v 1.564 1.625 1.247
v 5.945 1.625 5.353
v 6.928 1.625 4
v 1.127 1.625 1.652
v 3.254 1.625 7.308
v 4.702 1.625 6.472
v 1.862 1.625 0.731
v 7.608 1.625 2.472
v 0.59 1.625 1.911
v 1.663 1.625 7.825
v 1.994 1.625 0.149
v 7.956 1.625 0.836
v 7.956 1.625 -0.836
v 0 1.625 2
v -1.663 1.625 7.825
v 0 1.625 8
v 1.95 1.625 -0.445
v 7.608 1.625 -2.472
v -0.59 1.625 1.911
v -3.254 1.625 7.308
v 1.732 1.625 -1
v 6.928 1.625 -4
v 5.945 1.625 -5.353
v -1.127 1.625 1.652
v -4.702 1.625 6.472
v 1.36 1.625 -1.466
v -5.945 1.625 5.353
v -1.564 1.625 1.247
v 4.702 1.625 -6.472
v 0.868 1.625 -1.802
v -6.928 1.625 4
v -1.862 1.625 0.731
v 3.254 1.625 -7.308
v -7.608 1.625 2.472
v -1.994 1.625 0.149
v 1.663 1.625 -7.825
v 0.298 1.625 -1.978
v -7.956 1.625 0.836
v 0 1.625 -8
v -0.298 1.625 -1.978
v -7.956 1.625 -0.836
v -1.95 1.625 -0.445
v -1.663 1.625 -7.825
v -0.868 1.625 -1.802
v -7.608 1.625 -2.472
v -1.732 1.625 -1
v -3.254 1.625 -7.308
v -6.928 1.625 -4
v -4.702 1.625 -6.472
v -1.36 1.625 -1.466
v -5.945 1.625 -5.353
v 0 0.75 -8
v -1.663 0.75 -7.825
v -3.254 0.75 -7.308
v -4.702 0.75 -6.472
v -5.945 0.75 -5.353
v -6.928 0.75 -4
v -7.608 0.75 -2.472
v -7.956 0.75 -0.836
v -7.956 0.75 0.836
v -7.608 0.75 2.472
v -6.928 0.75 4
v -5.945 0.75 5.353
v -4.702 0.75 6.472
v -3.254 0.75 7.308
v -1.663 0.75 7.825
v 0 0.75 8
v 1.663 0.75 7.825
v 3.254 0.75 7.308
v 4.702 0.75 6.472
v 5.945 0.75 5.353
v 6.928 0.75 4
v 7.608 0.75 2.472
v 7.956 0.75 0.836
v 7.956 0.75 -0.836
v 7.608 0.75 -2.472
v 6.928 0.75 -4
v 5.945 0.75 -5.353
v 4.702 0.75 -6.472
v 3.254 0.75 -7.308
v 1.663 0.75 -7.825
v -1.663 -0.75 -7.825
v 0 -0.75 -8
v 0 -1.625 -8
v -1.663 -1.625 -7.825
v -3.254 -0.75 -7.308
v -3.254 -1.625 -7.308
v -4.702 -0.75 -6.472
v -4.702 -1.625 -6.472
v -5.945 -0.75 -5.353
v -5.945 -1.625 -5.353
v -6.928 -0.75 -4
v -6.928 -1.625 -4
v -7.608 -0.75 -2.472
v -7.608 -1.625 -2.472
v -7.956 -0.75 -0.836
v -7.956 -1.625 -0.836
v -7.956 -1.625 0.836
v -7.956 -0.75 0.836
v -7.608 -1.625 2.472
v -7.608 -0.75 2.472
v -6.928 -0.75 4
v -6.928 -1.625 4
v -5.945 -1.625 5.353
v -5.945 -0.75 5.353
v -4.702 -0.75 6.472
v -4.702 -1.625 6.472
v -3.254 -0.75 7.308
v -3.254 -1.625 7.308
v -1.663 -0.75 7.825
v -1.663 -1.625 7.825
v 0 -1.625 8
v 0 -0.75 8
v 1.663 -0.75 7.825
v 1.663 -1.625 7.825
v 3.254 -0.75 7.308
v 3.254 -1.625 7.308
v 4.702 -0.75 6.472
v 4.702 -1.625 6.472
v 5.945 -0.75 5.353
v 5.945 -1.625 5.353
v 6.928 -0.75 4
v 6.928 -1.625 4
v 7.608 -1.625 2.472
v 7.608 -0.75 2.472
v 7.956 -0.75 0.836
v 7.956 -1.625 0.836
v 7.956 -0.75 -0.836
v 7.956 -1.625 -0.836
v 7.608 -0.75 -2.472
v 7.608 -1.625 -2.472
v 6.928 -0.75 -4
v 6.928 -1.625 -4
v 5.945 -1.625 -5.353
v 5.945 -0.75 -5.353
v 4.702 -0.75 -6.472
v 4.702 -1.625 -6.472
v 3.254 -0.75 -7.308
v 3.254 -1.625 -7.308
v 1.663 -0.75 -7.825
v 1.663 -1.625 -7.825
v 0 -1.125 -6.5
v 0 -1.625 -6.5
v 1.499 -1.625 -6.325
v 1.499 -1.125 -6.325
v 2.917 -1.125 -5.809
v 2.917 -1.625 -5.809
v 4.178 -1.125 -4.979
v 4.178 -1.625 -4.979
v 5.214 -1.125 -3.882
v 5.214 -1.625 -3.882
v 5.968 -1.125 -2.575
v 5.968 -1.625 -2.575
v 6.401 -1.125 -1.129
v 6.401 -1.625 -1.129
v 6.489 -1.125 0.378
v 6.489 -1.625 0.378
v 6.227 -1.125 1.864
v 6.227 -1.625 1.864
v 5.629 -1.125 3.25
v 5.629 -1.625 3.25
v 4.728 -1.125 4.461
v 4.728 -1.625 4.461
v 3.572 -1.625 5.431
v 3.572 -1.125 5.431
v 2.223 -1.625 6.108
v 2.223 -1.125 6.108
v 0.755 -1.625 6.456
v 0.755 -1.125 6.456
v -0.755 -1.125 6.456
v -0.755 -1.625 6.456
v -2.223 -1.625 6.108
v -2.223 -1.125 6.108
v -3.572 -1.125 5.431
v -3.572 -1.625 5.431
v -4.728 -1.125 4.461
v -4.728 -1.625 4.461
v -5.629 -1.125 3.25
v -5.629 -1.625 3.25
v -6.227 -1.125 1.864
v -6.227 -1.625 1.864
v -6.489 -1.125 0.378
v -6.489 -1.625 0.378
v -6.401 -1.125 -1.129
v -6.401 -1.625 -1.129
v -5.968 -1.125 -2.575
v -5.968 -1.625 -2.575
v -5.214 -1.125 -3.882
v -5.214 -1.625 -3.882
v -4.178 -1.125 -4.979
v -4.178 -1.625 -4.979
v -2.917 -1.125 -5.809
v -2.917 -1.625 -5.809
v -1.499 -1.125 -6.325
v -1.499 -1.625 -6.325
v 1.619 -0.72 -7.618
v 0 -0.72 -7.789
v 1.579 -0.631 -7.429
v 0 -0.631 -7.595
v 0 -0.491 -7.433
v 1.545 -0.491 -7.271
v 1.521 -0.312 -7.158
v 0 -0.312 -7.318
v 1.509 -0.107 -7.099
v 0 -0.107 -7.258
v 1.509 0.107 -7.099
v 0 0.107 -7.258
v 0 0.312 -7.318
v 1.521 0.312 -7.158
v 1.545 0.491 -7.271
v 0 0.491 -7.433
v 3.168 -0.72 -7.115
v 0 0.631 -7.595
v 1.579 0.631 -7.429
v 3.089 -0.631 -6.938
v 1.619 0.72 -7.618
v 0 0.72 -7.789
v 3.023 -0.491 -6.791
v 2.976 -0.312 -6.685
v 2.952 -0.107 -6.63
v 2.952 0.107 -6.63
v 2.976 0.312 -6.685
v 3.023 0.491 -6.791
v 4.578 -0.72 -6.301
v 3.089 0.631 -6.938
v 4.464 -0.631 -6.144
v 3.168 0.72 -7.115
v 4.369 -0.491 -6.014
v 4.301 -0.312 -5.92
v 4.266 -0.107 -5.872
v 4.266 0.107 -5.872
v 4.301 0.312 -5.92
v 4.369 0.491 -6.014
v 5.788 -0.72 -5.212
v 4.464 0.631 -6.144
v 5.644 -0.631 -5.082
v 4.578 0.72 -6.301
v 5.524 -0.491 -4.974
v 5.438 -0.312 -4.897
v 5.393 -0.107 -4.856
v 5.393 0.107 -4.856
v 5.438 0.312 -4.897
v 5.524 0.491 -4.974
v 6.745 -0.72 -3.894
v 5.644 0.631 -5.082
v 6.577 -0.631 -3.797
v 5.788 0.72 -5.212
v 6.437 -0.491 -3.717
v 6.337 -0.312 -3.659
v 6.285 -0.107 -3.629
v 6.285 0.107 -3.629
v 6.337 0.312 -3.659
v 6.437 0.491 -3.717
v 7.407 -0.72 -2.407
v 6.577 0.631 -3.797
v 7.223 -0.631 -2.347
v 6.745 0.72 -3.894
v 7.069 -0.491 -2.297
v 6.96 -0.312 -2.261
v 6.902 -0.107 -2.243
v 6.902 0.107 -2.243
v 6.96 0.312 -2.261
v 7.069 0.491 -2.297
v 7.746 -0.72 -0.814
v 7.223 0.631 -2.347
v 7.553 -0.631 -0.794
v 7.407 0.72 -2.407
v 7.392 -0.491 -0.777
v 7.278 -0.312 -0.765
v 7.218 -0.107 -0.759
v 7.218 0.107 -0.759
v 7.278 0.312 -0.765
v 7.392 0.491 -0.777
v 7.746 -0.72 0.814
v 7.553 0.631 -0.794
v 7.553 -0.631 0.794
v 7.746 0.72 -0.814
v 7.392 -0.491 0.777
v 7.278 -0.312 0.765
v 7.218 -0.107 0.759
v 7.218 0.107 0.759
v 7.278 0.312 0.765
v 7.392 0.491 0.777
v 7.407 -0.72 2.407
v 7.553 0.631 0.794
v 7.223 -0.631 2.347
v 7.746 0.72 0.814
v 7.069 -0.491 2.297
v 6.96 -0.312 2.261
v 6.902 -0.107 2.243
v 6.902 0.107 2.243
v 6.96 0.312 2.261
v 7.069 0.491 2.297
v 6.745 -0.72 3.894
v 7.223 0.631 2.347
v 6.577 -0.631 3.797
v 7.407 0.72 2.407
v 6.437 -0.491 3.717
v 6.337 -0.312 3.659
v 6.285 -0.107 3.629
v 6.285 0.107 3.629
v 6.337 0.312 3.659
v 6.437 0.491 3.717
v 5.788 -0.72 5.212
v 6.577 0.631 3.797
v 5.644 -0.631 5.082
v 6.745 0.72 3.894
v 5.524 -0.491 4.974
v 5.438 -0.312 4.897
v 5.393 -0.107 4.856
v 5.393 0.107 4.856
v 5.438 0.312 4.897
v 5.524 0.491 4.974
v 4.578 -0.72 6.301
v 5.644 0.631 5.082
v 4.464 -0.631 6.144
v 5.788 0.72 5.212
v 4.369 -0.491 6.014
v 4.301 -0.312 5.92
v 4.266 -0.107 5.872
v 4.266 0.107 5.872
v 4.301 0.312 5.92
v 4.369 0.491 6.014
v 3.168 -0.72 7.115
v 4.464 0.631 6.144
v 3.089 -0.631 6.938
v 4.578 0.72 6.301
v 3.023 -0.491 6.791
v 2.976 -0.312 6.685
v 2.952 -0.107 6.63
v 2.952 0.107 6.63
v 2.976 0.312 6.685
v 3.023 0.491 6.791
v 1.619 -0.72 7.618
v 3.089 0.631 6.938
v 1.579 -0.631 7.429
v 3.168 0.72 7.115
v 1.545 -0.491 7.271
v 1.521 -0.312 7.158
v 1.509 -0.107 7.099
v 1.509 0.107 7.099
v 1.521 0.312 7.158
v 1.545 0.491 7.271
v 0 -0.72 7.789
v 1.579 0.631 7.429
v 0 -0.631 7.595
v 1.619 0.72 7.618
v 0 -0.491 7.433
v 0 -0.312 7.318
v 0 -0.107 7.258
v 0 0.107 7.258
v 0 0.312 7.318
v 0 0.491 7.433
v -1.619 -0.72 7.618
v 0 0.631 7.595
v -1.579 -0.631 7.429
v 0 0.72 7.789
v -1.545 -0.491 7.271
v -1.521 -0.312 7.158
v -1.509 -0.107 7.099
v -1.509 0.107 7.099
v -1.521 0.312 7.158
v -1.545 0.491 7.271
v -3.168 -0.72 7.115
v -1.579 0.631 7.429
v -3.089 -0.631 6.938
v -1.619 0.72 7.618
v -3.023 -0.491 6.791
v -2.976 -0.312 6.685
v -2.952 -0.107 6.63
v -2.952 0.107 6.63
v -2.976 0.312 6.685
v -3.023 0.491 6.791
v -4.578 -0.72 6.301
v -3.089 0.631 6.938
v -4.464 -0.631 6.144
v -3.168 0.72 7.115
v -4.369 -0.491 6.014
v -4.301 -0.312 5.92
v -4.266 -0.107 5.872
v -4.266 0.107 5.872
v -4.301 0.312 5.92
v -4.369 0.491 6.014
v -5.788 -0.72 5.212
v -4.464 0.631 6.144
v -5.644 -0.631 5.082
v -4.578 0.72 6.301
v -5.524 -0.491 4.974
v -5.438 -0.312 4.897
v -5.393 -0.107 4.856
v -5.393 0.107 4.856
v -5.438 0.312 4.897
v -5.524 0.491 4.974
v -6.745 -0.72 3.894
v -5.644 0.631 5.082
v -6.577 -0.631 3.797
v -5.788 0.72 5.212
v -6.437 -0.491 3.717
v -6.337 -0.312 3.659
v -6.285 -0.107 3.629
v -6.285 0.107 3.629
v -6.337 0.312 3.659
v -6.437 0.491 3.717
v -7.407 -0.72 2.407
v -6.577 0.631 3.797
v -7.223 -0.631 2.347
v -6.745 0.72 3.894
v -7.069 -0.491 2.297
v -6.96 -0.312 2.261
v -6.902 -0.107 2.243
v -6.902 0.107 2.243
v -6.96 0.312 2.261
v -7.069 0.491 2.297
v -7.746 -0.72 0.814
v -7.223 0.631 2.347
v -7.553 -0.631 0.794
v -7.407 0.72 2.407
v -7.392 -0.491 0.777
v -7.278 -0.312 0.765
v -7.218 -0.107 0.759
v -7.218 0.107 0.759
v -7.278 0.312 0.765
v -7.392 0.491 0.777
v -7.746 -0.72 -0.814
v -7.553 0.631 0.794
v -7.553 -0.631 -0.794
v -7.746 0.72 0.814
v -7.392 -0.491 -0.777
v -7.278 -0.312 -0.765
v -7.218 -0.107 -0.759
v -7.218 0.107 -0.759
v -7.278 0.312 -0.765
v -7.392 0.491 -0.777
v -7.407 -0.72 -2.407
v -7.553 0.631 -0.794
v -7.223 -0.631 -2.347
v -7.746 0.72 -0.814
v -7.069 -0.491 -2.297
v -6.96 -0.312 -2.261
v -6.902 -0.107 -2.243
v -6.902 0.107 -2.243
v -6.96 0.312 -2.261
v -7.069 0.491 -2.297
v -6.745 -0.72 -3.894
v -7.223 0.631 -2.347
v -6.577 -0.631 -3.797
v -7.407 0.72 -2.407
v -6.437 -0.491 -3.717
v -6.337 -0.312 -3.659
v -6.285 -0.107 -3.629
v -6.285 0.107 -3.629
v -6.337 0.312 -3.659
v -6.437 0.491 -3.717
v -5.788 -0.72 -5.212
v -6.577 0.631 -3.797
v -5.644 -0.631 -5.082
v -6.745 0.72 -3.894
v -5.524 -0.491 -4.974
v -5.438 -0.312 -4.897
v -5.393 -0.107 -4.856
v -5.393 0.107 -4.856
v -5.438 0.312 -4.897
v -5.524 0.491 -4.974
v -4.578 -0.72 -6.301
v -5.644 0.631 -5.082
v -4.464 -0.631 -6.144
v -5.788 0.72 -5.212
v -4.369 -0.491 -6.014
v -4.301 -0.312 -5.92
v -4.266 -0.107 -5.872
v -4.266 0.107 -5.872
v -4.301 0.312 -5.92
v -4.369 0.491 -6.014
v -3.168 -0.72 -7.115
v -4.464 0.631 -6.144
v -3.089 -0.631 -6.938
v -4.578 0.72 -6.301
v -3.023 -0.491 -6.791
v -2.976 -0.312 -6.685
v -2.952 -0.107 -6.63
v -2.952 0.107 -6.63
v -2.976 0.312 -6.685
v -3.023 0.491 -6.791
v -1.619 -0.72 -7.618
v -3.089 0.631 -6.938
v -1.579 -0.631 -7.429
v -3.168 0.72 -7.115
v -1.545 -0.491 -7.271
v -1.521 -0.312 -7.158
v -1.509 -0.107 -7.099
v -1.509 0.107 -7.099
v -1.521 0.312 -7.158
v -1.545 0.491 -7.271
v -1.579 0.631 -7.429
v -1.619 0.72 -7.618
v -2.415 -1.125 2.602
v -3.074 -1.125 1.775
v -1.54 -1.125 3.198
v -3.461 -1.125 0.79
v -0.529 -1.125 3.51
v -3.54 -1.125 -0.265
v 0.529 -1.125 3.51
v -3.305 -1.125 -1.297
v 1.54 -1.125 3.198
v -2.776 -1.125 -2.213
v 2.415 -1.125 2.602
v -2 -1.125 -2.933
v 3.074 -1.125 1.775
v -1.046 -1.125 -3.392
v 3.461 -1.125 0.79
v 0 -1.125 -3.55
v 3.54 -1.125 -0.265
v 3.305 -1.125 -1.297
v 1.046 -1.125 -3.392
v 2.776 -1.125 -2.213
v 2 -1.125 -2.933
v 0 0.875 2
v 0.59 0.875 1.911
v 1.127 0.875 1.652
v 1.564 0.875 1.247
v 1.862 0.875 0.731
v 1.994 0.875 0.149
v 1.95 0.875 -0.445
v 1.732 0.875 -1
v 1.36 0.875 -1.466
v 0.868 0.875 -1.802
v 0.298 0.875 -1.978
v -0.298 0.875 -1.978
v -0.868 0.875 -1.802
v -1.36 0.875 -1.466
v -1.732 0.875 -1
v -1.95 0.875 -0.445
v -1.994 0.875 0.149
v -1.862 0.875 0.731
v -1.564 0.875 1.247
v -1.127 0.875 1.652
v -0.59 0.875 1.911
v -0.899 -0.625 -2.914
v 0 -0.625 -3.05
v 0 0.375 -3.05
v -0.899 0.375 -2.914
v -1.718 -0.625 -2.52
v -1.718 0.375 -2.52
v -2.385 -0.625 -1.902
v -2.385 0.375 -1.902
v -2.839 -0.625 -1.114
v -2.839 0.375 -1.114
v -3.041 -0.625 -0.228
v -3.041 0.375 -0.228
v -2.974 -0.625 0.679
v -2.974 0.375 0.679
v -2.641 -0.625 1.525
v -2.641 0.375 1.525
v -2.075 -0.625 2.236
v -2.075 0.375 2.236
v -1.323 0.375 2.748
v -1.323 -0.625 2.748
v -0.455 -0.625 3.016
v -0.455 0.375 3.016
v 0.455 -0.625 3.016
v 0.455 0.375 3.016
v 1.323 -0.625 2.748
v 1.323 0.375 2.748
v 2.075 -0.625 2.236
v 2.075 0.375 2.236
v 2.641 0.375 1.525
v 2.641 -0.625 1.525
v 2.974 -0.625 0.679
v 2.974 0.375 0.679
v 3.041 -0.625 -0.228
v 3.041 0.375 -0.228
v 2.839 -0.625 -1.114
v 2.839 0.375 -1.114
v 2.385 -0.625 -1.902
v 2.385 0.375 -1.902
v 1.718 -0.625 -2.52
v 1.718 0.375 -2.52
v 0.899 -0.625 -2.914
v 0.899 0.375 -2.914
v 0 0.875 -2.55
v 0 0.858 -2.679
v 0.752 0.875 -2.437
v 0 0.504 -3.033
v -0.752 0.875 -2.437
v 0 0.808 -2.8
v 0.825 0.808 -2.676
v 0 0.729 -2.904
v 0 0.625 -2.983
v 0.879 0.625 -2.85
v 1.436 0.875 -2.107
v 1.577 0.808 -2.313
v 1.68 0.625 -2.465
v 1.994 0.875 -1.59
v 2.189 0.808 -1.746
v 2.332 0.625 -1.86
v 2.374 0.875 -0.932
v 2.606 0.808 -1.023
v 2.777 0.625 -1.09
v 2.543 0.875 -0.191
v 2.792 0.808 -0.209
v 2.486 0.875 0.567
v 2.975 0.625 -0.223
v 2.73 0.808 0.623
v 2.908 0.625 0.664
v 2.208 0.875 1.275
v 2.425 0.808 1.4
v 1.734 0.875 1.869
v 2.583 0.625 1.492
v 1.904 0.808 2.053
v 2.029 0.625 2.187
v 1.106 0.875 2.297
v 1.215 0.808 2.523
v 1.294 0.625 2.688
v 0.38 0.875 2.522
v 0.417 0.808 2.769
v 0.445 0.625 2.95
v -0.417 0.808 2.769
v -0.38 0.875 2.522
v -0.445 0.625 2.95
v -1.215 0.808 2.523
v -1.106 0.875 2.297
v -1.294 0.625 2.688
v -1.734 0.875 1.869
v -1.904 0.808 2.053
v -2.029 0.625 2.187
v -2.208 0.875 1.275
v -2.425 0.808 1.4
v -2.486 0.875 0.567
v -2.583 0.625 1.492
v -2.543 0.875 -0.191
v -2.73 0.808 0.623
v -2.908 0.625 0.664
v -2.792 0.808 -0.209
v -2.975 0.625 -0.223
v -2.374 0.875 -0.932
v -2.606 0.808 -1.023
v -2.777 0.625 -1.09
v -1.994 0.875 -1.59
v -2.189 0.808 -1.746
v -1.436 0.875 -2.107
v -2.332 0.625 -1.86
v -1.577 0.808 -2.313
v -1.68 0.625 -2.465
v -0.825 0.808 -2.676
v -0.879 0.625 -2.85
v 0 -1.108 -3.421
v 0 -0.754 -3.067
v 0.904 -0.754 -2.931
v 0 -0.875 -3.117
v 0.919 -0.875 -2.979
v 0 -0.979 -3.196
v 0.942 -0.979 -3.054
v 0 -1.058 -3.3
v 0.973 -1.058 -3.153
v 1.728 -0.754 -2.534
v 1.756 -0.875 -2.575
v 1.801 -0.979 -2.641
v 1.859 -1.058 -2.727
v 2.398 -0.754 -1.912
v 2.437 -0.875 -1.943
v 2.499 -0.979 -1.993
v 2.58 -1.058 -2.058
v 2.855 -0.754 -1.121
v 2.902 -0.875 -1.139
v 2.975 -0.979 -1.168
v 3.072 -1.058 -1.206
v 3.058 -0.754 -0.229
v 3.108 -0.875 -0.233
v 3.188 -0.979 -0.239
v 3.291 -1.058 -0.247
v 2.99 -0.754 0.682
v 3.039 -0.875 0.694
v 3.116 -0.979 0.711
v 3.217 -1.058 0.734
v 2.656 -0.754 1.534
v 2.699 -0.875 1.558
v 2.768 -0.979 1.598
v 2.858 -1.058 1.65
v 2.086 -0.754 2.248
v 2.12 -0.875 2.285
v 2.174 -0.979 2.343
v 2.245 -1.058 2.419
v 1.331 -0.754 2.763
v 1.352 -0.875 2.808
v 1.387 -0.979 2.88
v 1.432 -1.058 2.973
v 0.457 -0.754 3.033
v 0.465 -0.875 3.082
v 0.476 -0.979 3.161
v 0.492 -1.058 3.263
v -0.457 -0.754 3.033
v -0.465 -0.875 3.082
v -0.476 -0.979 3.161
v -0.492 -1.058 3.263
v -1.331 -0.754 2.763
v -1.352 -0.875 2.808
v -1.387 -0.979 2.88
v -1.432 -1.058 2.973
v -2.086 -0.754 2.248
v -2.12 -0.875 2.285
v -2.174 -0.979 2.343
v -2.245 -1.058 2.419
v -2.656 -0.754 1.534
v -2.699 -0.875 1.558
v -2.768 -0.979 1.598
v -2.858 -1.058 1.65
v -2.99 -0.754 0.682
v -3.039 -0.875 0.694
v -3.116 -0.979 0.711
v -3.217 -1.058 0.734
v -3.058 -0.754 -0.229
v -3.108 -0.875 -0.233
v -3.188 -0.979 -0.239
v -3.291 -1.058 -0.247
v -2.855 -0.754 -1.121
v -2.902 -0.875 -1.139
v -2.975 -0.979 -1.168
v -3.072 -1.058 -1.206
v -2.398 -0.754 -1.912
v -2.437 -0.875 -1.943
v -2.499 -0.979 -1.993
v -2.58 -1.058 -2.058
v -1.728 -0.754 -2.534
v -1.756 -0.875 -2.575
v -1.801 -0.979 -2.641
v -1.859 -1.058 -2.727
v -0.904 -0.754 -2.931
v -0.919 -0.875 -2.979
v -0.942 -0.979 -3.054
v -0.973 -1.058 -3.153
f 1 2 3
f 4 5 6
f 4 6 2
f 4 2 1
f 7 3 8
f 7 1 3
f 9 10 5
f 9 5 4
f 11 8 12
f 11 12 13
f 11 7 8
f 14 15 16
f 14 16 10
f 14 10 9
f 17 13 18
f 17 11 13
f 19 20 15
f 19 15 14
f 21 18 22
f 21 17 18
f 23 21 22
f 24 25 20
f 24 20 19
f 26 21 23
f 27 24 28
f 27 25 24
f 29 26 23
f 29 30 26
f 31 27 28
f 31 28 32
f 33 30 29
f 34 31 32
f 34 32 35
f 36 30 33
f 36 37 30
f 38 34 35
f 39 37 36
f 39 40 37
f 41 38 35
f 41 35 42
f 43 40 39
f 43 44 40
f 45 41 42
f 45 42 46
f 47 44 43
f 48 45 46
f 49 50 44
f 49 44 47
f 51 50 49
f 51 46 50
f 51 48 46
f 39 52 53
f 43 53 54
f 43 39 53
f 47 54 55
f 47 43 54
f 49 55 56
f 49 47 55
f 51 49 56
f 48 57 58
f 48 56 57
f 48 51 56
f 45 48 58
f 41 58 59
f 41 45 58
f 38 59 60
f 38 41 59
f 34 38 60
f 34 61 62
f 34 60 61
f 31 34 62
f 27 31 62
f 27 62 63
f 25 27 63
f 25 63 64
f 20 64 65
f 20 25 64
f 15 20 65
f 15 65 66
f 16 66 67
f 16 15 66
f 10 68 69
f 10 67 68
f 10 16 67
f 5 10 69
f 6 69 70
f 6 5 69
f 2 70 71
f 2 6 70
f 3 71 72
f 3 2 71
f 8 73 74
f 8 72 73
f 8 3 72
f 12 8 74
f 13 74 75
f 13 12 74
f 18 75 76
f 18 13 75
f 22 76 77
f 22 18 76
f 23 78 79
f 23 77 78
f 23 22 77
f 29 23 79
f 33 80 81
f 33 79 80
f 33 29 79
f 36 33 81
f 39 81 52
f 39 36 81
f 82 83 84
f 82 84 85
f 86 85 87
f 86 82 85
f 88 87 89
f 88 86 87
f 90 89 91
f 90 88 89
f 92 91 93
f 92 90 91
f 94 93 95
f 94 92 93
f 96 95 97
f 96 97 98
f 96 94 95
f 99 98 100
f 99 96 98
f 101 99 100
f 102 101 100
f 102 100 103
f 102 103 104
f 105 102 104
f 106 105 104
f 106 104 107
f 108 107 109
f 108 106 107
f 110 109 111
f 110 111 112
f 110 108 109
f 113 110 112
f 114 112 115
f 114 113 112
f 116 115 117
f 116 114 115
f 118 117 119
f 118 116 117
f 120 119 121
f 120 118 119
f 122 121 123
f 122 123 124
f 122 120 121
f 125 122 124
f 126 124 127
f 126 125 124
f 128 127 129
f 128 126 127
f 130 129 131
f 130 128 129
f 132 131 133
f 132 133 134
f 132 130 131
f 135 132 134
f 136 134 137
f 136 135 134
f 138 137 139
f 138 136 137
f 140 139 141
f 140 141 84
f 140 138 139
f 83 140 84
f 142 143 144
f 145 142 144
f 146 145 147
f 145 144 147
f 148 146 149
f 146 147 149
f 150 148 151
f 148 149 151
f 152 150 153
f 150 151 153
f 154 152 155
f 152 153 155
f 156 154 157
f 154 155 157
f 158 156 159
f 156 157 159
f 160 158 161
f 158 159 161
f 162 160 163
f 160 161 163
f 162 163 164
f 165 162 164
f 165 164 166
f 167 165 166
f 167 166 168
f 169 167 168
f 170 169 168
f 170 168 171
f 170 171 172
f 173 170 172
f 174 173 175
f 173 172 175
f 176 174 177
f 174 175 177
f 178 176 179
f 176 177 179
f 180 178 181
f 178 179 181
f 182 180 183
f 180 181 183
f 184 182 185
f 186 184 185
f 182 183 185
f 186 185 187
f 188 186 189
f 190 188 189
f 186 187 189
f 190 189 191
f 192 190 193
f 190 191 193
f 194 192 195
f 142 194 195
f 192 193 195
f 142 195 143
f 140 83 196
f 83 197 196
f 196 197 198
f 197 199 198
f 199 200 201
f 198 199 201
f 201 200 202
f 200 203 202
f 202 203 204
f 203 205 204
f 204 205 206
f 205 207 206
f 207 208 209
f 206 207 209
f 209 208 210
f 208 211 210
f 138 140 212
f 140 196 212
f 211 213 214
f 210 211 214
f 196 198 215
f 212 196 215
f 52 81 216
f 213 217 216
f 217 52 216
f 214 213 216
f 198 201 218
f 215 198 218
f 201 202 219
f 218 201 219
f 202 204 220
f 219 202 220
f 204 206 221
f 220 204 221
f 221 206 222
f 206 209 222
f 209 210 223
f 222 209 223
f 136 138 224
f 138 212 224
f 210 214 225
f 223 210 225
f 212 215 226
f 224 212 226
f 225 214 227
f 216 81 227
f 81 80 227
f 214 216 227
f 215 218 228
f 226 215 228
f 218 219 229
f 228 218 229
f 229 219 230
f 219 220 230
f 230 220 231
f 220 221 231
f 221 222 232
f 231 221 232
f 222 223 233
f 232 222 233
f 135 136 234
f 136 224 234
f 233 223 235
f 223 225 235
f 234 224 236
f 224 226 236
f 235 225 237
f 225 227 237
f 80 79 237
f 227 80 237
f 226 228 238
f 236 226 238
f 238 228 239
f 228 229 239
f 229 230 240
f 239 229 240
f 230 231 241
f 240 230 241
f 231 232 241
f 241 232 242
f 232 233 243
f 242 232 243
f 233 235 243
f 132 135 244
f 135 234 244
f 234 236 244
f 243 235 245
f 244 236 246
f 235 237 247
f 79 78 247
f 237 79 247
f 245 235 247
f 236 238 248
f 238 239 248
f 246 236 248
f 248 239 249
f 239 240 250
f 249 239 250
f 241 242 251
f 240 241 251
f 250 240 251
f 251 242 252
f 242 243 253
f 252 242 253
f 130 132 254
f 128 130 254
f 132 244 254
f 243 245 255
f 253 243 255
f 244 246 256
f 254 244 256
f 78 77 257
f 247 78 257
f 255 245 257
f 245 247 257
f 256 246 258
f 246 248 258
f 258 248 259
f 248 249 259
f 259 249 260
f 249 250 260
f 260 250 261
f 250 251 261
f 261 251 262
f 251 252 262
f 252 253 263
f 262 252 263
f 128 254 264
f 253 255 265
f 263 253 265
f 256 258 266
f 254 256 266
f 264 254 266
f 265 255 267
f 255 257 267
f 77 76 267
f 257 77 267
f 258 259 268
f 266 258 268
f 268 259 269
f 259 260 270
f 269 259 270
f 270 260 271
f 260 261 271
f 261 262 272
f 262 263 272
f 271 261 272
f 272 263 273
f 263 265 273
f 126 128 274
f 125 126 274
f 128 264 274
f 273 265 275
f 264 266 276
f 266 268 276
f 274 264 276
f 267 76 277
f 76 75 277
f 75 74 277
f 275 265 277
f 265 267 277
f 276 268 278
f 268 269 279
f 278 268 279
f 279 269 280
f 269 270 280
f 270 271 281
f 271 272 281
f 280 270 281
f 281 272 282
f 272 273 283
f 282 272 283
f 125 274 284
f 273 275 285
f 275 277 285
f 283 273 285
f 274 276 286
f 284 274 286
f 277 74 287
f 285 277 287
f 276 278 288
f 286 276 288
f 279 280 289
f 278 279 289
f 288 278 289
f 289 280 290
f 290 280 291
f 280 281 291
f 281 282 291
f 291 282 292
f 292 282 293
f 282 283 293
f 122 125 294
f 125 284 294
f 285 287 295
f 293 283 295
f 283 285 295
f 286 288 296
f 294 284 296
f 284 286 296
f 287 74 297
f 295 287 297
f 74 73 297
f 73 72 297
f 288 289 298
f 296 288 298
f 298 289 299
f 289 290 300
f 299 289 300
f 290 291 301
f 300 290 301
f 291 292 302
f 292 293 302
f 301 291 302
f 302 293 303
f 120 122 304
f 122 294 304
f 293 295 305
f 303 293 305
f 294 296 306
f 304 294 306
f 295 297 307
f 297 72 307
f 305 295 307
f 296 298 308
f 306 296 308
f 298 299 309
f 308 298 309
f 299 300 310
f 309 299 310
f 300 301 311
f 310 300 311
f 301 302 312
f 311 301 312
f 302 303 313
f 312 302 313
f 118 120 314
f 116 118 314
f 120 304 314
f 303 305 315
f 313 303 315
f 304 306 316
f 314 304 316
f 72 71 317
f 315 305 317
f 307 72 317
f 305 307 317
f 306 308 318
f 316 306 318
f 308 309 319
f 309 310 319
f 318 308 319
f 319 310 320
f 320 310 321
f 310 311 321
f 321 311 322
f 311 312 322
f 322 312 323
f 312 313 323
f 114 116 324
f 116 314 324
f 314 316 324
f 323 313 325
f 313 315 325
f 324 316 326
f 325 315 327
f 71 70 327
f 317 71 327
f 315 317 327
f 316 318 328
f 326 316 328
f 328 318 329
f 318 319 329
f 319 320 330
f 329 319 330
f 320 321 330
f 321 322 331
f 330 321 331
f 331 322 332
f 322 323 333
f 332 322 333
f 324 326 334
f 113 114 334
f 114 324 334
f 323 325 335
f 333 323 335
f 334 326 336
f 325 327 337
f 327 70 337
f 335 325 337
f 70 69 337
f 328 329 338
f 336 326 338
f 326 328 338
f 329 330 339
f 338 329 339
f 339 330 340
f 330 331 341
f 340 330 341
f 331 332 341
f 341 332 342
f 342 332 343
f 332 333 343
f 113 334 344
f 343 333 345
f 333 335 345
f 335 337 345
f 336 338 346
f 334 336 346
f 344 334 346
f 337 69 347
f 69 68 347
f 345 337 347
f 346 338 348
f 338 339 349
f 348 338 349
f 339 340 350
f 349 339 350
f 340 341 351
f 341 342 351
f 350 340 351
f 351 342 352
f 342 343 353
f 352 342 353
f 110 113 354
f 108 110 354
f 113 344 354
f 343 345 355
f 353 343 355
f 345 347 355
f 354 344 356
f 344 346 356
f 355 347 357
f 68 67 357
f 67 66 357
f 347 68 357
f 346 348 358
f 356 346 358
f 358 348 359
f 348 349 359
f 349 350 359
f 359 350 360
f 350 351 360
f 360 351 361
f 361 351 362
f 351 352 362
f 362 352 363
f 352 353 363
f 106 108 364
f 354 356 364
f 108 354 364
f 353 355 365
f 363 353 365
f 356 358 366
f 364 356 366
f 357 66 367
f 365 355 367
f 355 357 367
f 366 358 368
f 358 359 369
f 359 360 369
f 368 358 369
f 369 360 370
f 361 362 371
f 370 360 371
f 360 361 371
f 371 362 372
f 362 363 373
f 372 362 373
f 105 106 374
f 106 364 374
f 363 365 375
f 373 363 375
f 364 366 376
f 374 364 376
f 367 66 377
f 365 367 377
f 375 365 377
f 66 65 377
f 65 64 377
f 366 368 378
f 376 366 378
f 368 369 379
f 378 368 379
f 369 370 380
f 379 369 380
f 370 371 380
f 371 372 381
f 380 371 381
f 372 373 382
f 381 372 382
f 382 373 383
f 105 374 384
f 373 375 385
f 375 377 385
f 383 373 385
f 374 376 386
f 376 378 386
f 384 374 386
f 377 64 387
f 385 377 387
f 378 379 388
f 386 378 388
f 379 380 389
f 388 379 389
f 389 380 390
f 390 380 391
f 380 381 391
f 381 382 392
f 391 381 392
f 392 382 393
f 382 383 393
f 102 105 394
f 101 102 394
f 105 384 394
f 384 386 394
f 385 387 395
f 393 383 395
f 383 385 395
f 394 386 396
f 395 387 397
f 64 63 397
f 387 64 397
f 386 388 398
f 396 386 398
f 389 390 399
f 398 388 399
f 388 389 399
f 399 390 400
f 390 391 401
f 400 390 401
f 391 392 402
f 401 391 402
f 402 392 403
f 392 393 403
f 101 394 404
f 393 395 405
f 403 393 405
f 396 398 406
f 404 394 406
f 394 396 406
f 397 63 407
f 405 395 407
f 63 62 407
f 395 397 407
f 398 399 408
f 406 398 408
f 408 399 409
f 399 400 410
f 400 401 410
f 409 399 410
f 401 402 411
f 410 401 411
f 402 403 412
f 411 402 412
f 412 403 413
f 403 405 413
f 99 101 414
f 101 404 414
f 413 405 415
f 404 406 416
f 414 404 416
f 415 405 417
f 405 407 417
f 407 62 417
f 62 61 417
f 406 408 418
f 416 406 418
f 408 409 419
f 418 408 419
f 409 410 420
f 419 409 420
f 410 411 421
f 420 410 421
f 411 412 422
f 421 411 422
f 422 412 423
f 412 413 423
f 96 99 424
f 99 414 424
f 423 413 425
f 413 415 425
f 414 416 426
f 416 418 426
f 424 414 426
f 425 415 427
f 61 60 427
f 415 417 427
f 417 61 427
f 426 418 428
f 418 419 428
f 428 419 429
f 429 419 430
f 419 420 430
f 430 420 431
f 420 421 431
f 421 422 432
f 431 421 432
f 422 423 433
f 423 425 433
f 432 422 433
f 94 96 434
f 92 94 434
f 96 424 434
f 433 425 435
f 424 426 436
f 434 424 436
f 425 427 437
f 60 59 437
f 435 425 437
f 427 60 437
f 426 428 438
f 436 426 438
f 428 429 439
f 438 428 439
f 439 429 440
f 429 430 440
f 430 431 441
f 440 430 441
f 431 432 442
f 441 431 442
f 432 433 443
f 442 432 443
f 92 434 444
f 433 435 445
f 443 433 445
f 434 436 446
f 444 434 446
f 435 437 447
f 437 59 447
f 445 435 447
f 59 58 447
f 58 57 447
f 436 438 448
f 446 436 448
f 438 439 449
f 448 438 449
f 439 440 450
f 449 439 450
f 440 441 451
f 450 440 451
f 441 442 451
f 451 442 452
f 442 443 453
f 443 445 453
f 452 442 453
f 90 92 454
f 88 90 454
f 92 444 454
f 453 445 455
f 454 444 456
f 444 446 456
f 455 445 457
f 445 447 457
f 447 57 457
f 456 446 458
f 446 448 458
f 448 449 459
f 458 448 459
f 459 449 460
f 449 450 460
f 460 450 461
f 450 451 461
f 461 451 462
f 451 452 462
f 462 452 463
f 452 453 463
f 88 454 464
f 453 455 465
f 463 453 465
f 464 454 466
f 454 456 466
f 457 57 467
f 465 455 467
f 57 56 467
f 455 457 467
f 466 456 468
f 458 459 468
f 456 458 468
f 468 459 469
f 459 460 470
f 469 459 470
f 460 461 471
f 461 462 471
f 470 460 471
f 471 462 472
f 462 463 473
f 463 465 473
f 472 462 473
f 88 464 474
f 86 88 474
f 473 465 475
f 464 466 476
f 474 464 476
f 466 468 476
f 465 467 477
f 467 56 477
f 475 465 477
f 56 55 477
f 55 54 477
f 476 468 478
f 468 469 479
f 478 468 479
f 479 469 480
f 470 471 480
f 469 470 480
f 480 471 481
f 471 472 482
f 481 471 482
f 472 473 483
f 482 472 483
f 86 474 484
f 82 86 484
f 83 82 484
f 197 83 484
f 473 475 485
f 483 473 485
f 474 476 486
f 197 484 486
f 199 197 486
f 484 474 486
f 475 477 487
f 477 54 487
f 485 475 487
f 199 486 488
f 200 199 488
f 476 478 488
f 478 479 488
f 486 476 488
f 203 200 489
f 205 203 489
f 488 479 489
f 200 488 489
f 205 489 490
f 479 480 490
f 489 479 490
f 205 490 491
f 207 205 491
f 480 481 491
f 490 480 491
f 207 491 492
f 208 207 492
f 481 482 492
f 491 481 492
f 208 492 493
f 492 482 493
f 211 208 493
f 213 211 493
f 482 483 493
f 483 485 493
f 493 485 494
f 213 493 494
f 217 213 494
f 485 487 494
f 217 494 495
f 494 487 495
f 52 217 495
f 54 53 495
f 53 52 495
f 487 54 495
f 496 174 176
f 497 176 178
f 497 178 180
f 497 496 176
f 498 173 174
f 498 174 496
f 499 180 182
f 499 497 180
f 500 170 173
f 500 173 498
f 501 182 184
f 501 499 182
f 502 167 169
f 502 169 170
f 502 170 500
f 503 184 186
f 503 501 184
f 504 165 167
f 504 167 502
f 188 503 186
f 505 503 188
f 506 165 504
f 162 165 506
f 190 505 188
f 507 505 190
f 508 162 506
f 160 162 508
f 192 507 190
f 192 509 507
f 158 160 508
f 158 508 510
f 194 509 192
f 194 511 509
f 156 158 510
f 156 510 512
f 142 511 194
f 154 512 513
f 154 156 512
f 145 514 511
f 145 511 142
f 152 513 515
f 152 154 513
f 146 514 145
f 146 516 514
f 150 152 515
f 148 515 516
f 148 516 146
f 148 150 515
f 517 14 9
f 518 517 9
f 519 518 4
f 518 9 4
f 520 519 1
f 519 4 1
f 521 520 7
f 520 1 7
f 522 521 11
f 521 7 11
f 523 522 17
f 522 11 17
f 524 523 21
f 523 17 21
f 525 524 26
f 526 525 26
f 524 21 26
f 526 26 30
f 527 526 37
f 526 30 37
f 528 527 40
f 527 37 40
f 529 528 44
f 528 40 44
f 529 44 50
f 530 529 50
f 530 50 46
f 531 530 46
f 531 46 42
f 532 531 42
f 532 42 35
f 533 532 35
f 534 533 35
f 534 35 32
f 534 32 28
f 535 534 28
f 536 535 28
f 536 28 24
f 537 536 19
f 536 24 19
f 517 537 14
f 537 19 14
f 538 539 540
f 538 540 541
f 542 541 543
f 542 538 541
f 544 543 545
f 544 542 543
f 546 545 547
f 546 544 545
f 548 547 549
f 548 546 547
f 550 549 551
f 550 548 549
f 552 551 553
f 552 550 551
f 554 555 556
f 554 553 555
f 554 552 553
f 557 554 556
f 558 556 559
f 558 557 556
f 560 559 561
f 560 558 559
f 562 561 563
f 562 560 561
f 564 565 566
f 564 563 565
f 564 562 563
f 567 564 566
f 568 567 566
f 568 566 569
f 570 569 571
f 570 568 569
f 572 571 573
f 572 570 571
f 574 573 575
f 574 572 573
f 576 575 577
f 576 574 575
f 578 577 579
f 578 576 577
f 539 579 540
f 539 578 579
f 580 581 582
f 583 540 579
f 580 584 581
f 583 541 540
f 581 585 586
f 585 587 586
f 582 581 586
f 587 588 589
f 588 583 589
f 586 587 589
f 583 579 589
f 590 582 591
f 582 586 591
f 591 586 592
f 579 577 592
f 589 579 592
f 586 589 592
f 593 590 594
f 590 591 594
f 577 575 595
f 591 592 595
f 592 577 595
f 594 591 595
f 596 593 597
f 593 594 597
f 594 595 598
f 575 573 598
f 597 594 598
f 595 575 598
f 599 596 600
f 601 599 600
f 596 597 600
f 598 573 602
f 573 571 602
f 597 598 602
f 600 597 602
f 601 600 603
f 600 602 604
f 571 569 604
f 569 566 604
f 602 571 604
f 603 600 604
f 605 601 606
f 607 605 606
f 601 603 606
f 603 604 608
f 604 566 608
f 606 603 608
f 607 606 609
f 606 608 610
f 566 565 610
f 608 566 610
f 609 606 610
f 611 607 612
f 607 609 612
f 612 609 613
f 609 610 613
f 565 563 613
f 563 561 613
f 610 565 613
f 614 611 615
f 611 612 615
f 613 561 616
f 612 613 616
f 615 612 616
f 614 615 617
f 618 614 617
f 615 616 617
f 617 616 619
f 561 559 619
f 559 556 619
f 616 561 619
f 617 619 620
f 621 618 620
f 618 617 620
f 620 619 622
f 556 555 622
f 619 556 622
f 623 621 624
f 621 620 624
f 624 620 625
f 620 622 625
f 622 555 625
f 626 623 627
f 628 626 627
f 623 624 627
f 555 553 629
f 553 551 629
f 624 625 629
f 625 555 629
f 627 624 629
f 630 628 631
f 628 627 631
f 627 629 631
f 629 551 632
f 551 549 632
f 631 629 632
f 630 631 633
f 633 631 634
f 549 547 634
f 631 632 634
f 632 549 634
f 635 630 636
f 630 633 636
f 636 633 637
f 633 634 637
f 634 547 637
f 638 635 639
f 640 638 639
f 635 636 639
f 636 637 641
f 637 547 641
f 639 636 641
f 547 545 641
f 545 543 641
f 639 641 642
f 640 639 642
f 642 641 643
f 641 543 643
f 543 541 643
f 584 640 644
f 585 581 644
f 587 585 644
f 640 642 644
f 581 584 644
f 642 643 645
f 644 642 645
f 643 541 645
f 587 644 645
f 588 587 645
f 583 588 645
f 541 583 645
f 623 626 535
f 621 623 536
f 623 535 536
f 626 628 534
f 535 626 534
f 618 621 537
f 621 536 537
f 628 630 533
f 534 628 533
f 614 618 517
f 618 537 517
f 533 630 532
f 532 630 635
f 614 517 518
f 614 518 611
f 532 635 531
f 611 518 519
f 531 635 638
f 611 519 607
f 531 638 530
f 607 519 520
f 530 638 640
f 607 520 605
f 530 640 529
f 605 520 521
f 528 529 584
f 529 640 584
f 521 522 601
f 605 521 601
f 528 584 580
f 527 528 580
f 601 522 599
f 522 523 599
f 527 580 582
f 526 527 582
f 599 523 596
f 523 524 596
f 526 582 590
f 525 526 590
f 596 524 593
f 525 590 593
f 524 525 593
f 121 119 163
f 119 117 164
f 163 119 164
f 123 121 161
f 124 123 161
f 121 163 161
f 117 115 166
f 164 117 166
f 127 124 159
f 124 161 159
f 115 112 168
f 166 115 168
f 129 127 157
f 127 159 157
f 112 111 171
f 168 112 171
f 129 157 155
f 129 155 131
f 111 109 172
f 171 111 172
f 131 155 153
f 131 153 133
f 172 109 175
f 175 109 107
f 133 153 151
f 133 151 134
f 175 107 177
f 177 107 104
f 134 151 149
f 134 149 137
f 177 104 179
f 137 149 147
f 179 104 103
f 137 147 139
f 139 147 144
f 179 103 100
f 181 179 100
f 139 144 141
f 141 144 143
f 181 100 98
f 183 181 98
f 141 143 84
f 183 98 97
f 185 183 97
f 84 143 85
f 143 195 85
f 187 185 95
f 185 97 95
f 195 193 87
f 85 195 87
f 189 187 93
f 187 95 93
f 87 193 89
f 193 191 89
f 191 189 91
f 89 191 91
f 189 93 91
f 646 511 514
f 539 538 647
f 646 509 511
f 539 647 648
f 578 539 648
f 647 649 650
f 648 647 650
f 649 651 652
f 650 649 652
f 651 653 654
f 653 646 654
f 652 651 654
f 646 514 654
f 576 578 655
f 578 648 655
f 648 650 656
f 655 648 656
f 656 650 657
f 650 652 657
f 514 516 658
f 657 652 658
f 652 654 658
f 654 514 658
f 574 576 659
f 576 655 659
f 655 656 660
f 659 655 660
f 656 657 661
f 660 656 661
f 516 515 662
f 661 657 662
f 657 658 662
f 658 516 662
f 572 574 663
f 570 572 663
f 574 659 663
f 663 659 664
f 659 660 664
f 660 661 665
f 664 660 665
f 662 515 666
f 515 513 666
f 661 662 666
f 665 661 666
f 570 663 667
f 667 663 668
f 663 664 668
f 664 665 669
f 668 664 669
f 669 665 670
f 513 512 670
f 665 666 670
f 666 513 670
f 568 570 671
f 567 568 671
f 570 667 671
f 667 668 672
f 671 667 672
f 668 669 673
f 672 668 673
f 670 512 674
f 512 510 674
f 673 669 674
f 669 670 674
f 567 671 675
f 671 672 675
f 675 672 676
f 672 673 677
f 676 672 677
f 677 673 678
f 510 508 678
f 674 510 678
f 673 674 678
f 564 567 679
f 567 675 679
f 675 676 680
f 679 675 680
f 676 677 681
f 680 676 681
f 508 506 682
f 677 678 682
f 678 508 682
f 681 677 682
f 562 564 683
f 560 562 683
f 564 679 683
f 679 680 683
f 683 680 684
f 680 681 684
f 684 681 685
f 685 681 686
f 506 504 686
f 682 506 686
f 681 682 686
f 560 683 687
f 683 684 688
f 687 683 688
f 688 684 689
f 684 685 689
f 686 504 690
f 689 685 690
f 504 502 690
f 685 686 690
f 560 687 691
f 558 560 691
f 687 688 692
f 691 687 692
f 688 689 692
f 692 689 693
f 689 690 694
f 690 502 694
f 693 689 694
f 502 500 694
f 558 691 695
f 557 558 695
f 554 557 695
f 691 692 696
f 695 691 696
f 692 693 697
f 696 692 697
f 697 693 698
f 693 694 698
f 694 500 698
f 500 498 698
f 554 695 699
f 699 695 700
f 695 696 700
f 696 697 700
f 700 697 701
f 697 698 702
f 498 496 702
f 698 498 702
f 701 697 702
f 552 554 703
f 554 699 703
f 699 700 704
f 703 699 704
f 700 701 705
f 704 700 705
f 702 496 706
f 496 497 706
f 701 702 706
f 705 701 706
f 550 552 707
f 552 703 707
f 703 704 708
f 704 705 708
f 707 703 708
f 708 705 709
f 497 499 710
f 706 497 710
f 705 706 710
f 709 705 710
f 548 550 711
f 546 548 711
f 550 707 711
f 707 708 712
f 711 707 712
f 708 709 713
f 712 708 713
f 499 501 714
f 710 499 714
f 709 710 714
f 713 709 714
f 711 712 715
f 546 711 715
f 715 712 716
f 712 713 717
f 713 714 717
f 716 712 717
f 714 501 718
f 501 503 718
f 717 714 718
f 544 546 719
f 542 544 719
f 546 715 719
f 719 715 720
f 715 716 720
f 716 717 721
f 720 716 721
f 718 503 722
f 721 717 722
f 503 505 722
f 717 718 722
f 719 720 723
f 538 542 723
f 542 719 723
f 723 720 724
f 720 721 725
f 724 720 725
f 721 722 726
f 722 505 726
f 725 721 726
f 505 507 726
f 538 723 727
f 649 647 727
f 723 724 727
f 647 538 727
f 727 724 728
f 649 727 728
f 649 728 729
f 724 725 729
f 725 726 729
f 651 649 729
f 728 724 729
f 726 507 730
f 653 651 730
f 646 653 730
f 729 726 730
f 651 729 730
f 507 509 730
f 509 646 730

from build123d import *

# Parameters (mm, degrees)
SKETCH1_R           = 8
SKETCH1_R_2         = 3.05
BOSS_EXTRUDE1_DEPTH = 1.625
SKETCH3_R           = 3.5
SKETCH3_R_2         = 2
BOSS_EXTRUDE2_DEPTH = 0.75
SKETCH4_R           = 6.5
SKETCH4_R_2         = 3
CUT_EXTRUDE1_DEPTH  = 0.5
FILLET1_R           = 0.5


with BuildPart() as part:
    # Sketch1 → Boss-Extrude1 (new, symmetric)
    with BuildSketch(Plane(origin=(0, 0, 0), x_dir=(1, 0, 0), z_dir=(0, 1, 0))):
        with Locations(Location((0, 0, 0), (0, 0, 90))):
            Circle(SKETCH1_R)
        with Locations(Location((0, 0, 0), (0, 0, 90))):
            Circle(SKETCH1_R_2, mode=Mode.SUBTRACT)
    extrude(amount=BOSS_EXTRUDE1_DEPTH, both=True)

    # Sketch2 → Cut-Revolve1 (revolve, cut)
    with BuildSketch(Plane(origin=(0, 0, 0), x_dir=(0, 0, -1), z_dir=(1, 0, 0)), mode=Mode.PRIVATE) as cut_revolve1_sk:
        with BuildLine():
            Line((-8, 0.75), (-8, -0.75))
            ThreePointArc((-8, -0.75), (-7.25, 0), (-8, 0.75))
        make_face()
    revolve(cut_revolve1_sk.sketch.rotate(Axis((0, 1.625, 0), (0, -1, 0)), 180), axis=Axis((0, 1.625, 0), (0, -1, 0)), mode=Mode.SUBTRACT)

    # Sketch3 → Boss-Extrude2 (add)
    with BuildSketch(Plane(origin=(0, 1.625, 0), x_dir=(1, 0, 0), z_dir=(0, 1, 0))):
        Circle(SKETCH3_R)
        with Locations(Location((0, 0, 0), (0, 0, 270))):
            Circle(SKETCH3_R_2, mode=Mode.SUBTRACT)
    extrude(amount=-BOSS_EXTRUDE2_DEPTH)

    # Sketch4 → Cut-Extrude1 (cut)
    with BuildSketch(Plane.XZ.offset(1.625)):
        with Locations(Location((0, 0, 0), (0, 0, 270))):
            Circle(SKETCH4_R)
        Circle(SKETCH4_R_2, mode=Mode.SUBTRACT)
    extrude(amount=-CUT_EXTRUDE1_DEPTH, mode=Mode.SUBTRACT)

    # Fillet1
    fillet1_edges = [part.edges().sort_by_distance(p)[0] for p in [
        (0, 0.875, 3.05),
        (0, -1.125, 3.05),
    ]]
    fillet(fillet1_edges, radius=FILLET1_R)


solid = part.part
